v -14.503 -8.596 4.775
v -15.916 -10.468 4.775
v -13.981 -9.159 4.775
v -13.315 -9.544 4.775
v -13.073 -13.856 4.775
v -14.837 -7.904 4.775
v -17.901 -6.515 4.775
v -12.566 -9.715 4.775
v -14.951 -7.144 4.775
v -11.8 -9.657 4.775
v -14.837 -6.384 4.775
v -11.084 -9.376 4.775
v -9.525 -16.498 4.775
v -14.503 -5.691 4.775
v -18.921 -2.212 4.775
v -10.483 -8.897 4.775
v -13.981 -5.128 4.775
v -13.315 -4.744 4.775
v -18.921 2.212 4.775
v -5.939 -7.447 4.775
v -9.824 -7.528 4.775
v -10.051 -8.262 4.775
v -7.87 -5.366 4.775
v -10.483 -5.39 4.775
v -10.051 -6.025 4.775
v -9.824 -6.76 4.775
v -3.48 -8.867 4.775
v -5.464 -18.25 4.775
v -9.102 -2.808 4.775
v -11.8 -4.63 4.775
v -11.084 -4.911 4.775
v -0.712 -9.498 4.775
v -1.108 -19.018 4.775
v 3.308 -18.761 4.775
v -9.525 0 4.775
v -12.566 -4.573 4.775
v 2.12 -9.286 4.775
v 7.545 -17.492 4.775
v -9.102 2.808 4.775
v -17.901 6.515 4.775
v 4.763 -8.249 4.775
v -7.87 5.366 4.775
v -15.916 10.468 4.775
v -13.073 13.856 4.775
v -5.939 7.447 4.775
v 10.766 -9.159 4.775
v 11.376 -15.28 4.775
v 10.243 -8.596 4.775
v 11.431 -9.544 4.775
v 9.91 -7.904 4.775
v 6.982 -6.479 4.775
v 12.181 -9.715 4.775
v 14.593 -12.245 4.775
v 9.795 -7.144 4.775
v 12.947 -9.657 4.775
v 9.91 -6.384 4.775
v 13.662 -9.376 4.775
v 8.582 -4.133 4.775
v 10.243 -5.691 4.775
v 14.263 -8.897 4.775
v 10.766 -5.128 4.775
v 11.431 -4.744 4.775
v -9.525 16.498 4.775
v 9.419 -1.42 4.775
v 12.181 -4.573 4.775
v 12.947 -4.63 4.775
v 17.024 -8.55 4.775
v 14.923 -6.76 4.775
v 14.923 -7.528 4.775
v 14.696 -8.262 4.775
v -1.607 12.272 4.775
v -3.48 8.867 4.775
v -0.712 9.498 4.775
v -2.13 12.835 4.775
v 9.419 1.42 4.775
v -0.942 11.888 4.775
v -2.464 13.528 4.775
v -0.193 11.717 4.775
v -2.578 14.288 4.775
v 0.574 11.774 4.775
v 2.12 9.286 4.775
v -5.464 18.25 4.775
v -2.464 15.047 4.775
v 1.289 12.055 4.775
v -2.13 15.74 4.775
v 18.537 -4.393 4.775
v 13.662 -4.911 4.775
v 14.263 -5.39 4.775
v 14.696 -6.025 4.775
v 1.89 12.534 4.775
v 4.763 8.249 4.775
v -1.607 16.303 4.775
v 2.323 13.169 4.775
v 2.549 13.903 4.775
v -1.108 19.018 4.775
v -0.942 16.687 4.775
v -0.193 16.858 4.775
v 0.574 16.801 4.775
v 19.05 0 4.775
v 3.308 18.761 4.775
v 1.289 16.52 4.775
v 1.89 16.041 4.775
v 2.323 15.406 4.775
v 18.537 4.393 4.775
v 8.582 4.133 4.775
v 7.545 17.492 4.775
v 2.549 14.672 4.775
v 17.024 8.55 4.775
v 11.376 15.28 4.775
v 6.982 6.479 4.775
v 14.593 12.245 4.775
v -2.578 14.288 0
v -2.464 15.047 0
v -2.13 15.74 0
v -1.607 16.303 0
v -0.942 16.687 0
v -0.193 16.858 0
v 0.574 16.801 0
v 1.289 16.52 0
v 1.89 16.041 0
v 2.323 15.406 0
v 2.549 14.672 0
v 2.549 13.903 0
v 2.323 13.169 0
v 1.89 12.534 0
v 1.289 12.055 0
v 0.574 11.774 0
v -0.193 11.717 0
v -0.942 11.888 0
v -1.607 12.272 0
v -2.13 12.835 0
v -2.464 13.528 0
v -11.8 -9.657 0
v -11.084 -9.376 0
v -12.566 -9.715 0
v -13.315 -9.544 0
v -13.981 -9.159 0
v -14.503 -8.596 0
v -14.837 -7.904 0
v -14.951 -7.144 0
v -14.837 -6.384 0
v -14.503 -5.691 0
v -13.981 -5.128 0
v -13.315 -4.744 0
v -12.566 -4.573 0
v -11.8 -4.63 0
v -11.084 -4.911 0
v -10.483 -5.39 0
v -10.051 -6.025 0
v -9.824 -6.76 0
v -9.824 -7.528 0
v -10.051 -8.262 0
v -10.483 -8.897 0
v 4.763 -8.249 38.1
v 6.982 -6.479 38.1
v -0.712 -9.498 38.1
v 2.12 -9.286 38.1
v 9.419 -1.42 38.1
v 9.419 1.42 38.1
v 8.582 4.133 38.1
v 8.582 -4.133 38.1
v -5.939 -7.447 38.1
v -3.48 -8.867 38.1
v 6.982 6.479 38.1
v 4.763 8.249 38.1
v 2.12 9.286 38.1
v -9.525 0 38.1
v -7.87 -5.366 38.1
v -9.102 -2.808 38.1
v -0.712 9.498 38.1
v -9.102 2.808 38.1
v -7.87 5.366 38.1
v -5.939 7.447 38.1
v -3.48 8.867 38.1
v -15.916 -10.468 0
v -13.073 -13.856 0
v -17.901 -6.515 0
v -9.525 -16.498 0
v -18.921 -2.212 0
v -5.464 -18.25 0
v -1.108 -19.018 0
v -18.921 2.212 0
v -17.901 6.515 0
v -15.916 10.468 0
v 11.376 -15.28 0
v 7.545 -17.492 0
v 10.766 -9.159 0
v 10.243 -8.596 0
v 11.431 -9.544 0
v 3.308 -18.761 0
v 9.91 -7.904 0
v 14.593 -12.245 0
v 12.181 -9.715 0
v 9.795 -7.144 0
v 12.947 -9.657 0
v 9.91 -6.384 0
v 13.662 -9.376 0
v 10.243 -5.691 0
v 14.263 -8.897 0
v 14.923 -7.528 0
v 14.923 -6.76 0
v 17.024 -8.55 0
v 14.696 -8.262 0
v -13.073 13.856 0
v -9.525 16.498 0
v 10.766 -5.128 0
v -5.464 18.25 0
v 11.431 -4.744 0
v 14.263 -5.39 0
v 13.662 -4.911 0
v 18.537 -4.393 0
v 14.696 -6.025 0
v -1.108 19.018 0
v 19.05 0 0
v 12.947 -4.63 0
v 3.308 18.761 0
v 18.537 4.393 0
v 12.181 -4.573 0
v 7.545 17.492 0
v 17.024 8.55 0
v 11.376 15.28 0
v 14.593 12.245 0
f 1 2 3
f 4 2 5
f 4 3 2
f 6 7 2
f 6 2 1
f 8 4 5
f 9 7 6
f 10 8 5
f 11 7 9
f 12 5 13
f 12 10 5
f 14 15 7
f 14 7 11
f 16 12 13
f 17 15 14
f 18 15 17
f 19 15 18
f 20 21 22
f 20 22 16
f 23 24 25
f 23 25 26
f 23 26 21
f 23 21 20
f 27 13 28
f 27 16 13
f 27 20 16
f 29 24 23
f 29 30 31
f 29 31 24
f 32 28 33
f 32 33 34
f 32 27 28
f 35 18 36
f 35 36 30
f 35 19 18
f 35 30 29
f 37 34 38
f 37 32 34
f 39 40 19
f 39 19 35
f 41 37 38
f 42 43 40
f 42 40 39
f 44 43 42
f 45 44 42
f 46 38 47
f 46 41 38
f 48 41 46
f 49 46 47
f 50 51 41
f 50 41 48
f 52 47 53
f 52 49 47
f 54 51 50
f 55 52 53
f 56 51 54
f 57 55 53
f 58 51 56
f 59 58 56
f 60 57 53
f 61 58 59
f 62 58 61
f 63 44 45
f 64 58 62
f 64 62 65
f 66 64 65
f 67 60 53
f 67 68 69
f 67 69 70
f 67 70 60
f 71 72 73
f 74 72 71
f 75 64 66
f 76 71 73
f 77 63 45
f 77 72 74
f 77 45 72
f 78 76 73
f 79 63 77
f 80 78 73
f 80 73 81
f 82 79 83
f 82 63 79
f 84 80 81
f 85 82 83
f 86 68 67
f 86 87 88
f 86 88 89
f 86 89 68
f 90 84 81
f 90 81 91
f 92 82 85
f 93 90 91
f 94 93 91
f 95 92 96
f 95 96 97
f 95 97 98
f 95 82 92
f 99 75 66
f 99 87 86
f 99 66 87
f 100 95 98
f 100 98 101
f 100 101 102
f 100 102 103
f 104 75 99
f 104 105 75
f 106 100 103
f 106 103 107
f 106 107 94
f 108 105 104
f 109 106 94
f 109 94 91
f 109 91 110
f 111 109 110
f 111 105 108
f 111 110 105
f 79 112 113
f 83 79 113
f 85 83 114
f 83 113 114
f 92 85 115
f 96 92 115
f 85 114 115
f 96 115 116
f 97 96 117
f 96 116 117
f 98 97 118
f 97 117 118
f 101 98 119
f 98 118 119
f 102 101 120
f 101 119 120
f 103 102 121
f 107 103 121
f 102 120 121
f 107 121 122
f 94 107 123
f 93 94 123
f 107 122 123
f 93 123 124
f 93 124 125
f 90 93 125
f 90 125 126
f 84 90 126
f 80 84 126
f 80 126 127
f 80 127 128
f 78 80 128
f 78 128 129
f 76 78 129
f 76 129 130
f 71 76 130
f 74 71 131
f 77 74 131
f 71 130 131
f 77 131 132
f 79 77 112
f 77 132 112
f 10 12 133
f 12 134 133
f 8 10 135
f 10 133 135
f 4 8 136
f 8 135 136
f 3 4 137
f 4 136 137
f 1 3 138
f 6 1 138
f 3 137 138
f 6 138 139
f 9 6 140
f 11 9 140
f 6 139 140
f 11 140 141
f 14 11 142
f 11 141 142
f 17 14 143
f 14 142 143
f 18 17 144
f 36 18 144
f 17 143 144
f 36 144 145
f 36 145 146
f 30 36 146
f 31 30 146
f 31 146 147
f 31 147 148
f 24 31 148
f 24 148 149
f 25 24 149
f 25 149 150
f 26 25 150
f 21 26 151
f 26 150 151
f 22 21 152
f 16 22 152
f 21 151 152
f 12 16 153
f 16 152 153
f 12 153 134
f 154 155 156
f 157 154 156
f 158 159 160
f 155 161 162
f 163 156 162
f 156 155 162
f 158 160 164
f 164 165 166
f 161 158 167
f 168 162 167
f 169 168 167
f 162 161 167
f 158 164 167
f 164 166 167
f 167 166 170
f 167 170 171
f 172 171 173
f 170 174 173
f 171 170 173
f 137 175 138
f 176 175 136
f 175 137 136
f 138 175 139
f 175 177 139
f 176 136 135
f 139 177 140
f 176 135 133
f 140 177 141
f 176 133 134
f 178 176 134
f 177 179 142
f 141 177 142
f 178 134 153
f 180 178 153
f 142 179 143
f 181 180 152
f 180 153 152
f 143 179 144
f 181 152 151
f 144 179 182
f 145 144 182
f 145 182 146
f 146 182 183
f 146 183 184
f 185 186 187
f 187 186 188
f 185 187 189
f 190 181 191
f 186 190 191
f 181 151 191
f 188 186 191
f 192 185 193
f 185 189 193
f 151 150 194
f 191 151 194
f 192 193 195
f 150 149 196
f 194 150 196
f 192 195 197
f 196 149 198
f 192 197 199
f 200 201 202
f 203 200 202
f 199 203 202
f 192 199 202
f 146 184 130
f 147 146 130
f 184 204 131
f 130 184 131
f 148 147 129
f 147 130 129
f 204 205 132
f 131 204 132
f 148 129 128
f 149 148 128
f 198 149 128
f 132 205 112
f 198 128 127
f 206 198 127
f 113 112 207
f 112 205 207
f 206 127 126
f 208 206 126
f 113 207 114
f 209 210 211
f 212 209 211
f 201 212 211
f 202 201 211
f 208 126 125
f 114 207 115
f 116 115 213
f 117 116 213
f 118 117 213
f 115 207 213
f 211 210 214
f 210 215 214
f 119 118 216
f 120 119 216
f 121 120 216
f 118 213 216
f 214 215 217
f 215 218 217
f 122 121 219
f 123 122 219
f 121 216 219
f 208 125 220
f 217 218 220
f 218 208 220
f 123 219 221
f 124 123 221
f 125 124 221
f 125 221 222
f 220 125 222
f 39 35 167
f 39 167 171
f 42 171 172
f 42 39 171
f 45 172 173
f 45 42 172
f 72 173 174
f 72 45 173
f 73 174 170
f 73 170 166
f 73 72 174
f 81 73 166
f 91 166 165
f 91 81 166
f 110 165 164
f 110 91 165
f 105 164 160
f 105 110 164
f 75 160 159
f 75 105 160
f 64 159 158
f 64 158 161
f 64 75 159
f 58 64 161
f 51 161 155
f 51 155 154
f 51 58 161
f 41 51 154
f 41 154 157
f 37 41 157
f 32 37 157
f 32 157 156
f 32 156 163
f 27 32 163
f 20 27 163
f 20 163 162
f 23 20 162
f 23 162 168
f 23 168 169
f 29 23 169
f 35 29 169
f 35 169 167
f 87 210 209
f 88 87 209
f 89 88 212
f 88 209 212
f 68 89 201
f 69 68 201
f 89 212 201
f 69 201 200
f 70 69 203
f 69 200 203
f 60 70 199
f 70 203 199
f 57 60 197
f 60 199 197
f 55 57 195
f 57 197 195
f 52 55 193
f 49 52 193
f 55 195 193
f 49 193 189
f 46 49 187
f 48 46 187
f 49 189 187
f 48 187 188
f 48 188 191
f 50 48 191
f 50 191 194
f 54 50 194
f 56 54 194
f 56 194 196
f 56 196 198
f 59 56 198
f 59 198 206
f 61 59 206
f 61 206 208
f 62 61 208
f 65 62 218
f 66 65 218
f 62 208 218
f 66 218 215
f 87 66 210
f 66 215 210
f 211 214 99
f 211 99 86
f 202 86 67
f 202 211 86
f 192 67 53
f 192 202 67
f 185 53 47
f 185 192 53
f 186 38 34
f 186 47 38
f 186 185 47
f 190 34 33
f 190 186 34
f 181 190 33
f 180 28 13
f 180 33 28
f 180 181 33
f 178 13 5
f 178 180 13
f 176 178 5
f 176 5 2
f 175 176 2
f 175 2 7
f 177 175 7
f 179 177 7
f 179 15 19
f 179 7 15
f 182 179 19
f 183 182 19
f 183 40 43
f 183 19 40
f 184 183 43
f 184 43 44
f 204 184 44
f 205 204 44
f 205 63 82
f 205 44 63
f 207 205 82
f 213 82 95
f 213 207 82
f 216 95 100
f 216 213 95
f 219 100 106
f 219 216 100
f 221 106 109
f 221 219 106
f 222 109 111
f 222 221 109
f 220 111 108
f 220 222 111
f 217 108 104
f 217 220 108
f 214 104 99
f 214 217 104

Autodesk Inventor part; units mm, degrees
ref_plane "YZ Plane" through (0, 0, 0) normal (1, 0, 0) x (0, 1, 0)
ref_plane "XZ Plane" through (0, 0, 0) normal (0, 1, 0) x (-1, 0, 0)
ref_plane "XY Plane" through (0, 0, 0) normal (0, 0, 1) x (1, 0, 0)
sketch "Sketch1" plane through (0, 0, 0) normal (0, 0, 1) x (1, 0, 0)
  circle A0 centre (0, 0) radius 19.05
  dimension "d0" = 38.1
extrude "Extrusion1" add sketch "Sketch1" along normal blind 4.7752
sketch "Sketch2" plane through (0, 0, 0) normal (0, 0, -1) x (-1, 0, 0)
  circle A0 centre (0, 0) radius 19.05 projected
  circle A1 centre (0, 0) radius 9.525
  dimension "d5" = 19.05
extrude "Extrusion2" add sketch "Sketch2" against normal blind 38.1 contours A1
sketch "Sketch3" plane through (0, 0, 0) normal (0, 0, -1) x (-1, 0, 0)
  circle A0 centre (0, 0) radius 19.05 projected
  circle A1 centre (0, 14.2875) radius 2.5781
  dimension "d10" = 5.1562
  dimension "d12" = 14.2875
extrude "Extrusion3" cut sketch "Sketch3" against normal through all contours A1
pattern_circular "Circular Pattern1" count 3 over 360 about axis through (0, 0, 0) along (0, 0, 1) of "Extrusion3"
properties part number "LEAD NUT BLANK"
